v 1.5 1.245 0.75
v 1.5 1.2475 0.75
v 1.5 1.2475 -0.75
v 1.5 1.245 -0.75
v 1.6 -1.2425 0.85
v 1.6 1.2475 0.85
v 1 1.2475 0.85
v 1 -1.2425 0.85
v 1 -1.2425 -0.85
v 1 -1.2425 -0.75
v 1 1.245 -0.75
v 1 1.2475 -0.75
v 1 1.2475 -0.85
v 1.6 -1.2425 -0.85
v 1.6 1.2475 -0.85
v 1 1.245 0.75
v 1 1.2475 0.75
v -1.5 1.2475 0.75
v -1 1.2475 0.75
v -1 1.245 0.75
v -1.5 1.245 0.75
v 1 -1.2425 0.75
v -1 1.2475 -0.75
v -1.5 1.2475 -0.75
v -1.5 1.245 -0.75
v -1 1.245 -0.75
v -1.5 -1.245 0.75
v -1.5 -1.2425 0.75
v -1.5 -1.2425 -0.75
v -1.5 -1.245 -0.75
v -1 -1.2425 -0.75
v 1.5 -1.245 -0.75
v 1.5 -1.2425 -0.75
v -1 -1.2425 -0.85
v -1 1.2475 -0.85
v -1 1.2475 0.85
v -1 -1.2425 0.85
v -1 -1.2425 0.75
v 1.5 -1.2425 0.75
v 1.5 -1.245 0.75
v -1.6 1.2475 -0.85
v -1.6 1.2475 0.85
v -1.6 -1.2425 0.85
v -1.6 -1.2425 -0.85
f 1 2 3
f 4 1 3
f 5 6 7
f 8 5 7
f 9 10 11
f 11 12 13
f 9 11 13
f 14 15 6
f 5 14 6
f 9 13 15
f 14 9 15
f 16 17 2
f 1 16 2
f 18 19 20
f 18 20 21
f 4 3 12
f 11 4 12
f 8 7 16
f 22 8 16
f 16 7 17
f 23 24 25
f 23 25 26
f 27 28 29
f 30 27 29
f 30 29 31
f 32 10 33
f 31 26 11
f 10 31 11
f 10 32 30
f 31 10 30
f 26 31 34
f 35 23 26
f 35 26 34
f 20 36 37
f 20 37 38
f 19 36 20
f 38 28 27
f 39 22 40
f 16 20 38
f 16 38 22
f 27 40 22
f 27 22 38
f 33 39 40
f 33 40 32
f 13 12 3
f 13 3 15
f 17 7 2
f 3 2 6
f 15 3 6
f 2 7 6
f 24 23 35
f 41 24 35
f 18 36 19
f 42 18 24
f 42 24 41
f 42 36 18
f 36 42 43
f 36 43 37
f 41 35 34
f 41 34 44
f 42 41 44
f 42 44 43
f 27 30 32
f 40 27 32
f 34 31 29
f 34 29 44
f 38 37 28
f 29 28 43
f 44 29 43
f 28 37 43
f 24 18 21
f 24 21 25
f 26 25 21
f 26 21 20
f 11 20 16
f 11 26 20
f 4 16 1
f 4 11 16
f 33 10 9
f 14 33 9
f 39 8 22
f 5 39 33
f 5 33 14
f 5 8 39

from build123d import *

# Parameters (mm, degrees)
SKETCH2_W           = 3
SKETCH2_H           = 1.5
BASE_EXTRUDE_DEPTH  = 1.245
BOSS_EXTRUDE8_DEPTH = 2.49


with BuildPart() as part:
    # Sketch2 → Base-Extrude (new body, symmetric)
    with BuildSketch(Plane(origin=(0, 0, 0), x_dir=(1, 0, 0), z_dir=(0, 1, 0))):
        Rectangle(SKETCH2_W, SKETCH2_H)
    extrude(amount=BASE_EXTRUDE_DEPTH, both=True)

    # Sketch3 → Boss-Extrude8 (add)
    with BuildSketch(Plane(origin=(0, 1.24754, 0), x_dir=(-1, 0, 0), z_dir=(0, 1, 0))):
        Polygon((1, 0.85), (1, 0.75), (1.5, 0.75), (1.5, -0.75), (1, -0.75), (1, -0.85), (1.6, -0.85), (1.6, 0.85), align=None)
    boss_extrude8 = extrude(amount=-BOSS_EXTRUDE8_DEPTH)

    # Espelhar1: Boss-Extrude8 across plane
    add(boss_extrude8.mirror(Plane(origin=(0, 0, 0), x_dir=(0, 0, 1), z_dir=(1, 0, 0))))


solid = part.part
